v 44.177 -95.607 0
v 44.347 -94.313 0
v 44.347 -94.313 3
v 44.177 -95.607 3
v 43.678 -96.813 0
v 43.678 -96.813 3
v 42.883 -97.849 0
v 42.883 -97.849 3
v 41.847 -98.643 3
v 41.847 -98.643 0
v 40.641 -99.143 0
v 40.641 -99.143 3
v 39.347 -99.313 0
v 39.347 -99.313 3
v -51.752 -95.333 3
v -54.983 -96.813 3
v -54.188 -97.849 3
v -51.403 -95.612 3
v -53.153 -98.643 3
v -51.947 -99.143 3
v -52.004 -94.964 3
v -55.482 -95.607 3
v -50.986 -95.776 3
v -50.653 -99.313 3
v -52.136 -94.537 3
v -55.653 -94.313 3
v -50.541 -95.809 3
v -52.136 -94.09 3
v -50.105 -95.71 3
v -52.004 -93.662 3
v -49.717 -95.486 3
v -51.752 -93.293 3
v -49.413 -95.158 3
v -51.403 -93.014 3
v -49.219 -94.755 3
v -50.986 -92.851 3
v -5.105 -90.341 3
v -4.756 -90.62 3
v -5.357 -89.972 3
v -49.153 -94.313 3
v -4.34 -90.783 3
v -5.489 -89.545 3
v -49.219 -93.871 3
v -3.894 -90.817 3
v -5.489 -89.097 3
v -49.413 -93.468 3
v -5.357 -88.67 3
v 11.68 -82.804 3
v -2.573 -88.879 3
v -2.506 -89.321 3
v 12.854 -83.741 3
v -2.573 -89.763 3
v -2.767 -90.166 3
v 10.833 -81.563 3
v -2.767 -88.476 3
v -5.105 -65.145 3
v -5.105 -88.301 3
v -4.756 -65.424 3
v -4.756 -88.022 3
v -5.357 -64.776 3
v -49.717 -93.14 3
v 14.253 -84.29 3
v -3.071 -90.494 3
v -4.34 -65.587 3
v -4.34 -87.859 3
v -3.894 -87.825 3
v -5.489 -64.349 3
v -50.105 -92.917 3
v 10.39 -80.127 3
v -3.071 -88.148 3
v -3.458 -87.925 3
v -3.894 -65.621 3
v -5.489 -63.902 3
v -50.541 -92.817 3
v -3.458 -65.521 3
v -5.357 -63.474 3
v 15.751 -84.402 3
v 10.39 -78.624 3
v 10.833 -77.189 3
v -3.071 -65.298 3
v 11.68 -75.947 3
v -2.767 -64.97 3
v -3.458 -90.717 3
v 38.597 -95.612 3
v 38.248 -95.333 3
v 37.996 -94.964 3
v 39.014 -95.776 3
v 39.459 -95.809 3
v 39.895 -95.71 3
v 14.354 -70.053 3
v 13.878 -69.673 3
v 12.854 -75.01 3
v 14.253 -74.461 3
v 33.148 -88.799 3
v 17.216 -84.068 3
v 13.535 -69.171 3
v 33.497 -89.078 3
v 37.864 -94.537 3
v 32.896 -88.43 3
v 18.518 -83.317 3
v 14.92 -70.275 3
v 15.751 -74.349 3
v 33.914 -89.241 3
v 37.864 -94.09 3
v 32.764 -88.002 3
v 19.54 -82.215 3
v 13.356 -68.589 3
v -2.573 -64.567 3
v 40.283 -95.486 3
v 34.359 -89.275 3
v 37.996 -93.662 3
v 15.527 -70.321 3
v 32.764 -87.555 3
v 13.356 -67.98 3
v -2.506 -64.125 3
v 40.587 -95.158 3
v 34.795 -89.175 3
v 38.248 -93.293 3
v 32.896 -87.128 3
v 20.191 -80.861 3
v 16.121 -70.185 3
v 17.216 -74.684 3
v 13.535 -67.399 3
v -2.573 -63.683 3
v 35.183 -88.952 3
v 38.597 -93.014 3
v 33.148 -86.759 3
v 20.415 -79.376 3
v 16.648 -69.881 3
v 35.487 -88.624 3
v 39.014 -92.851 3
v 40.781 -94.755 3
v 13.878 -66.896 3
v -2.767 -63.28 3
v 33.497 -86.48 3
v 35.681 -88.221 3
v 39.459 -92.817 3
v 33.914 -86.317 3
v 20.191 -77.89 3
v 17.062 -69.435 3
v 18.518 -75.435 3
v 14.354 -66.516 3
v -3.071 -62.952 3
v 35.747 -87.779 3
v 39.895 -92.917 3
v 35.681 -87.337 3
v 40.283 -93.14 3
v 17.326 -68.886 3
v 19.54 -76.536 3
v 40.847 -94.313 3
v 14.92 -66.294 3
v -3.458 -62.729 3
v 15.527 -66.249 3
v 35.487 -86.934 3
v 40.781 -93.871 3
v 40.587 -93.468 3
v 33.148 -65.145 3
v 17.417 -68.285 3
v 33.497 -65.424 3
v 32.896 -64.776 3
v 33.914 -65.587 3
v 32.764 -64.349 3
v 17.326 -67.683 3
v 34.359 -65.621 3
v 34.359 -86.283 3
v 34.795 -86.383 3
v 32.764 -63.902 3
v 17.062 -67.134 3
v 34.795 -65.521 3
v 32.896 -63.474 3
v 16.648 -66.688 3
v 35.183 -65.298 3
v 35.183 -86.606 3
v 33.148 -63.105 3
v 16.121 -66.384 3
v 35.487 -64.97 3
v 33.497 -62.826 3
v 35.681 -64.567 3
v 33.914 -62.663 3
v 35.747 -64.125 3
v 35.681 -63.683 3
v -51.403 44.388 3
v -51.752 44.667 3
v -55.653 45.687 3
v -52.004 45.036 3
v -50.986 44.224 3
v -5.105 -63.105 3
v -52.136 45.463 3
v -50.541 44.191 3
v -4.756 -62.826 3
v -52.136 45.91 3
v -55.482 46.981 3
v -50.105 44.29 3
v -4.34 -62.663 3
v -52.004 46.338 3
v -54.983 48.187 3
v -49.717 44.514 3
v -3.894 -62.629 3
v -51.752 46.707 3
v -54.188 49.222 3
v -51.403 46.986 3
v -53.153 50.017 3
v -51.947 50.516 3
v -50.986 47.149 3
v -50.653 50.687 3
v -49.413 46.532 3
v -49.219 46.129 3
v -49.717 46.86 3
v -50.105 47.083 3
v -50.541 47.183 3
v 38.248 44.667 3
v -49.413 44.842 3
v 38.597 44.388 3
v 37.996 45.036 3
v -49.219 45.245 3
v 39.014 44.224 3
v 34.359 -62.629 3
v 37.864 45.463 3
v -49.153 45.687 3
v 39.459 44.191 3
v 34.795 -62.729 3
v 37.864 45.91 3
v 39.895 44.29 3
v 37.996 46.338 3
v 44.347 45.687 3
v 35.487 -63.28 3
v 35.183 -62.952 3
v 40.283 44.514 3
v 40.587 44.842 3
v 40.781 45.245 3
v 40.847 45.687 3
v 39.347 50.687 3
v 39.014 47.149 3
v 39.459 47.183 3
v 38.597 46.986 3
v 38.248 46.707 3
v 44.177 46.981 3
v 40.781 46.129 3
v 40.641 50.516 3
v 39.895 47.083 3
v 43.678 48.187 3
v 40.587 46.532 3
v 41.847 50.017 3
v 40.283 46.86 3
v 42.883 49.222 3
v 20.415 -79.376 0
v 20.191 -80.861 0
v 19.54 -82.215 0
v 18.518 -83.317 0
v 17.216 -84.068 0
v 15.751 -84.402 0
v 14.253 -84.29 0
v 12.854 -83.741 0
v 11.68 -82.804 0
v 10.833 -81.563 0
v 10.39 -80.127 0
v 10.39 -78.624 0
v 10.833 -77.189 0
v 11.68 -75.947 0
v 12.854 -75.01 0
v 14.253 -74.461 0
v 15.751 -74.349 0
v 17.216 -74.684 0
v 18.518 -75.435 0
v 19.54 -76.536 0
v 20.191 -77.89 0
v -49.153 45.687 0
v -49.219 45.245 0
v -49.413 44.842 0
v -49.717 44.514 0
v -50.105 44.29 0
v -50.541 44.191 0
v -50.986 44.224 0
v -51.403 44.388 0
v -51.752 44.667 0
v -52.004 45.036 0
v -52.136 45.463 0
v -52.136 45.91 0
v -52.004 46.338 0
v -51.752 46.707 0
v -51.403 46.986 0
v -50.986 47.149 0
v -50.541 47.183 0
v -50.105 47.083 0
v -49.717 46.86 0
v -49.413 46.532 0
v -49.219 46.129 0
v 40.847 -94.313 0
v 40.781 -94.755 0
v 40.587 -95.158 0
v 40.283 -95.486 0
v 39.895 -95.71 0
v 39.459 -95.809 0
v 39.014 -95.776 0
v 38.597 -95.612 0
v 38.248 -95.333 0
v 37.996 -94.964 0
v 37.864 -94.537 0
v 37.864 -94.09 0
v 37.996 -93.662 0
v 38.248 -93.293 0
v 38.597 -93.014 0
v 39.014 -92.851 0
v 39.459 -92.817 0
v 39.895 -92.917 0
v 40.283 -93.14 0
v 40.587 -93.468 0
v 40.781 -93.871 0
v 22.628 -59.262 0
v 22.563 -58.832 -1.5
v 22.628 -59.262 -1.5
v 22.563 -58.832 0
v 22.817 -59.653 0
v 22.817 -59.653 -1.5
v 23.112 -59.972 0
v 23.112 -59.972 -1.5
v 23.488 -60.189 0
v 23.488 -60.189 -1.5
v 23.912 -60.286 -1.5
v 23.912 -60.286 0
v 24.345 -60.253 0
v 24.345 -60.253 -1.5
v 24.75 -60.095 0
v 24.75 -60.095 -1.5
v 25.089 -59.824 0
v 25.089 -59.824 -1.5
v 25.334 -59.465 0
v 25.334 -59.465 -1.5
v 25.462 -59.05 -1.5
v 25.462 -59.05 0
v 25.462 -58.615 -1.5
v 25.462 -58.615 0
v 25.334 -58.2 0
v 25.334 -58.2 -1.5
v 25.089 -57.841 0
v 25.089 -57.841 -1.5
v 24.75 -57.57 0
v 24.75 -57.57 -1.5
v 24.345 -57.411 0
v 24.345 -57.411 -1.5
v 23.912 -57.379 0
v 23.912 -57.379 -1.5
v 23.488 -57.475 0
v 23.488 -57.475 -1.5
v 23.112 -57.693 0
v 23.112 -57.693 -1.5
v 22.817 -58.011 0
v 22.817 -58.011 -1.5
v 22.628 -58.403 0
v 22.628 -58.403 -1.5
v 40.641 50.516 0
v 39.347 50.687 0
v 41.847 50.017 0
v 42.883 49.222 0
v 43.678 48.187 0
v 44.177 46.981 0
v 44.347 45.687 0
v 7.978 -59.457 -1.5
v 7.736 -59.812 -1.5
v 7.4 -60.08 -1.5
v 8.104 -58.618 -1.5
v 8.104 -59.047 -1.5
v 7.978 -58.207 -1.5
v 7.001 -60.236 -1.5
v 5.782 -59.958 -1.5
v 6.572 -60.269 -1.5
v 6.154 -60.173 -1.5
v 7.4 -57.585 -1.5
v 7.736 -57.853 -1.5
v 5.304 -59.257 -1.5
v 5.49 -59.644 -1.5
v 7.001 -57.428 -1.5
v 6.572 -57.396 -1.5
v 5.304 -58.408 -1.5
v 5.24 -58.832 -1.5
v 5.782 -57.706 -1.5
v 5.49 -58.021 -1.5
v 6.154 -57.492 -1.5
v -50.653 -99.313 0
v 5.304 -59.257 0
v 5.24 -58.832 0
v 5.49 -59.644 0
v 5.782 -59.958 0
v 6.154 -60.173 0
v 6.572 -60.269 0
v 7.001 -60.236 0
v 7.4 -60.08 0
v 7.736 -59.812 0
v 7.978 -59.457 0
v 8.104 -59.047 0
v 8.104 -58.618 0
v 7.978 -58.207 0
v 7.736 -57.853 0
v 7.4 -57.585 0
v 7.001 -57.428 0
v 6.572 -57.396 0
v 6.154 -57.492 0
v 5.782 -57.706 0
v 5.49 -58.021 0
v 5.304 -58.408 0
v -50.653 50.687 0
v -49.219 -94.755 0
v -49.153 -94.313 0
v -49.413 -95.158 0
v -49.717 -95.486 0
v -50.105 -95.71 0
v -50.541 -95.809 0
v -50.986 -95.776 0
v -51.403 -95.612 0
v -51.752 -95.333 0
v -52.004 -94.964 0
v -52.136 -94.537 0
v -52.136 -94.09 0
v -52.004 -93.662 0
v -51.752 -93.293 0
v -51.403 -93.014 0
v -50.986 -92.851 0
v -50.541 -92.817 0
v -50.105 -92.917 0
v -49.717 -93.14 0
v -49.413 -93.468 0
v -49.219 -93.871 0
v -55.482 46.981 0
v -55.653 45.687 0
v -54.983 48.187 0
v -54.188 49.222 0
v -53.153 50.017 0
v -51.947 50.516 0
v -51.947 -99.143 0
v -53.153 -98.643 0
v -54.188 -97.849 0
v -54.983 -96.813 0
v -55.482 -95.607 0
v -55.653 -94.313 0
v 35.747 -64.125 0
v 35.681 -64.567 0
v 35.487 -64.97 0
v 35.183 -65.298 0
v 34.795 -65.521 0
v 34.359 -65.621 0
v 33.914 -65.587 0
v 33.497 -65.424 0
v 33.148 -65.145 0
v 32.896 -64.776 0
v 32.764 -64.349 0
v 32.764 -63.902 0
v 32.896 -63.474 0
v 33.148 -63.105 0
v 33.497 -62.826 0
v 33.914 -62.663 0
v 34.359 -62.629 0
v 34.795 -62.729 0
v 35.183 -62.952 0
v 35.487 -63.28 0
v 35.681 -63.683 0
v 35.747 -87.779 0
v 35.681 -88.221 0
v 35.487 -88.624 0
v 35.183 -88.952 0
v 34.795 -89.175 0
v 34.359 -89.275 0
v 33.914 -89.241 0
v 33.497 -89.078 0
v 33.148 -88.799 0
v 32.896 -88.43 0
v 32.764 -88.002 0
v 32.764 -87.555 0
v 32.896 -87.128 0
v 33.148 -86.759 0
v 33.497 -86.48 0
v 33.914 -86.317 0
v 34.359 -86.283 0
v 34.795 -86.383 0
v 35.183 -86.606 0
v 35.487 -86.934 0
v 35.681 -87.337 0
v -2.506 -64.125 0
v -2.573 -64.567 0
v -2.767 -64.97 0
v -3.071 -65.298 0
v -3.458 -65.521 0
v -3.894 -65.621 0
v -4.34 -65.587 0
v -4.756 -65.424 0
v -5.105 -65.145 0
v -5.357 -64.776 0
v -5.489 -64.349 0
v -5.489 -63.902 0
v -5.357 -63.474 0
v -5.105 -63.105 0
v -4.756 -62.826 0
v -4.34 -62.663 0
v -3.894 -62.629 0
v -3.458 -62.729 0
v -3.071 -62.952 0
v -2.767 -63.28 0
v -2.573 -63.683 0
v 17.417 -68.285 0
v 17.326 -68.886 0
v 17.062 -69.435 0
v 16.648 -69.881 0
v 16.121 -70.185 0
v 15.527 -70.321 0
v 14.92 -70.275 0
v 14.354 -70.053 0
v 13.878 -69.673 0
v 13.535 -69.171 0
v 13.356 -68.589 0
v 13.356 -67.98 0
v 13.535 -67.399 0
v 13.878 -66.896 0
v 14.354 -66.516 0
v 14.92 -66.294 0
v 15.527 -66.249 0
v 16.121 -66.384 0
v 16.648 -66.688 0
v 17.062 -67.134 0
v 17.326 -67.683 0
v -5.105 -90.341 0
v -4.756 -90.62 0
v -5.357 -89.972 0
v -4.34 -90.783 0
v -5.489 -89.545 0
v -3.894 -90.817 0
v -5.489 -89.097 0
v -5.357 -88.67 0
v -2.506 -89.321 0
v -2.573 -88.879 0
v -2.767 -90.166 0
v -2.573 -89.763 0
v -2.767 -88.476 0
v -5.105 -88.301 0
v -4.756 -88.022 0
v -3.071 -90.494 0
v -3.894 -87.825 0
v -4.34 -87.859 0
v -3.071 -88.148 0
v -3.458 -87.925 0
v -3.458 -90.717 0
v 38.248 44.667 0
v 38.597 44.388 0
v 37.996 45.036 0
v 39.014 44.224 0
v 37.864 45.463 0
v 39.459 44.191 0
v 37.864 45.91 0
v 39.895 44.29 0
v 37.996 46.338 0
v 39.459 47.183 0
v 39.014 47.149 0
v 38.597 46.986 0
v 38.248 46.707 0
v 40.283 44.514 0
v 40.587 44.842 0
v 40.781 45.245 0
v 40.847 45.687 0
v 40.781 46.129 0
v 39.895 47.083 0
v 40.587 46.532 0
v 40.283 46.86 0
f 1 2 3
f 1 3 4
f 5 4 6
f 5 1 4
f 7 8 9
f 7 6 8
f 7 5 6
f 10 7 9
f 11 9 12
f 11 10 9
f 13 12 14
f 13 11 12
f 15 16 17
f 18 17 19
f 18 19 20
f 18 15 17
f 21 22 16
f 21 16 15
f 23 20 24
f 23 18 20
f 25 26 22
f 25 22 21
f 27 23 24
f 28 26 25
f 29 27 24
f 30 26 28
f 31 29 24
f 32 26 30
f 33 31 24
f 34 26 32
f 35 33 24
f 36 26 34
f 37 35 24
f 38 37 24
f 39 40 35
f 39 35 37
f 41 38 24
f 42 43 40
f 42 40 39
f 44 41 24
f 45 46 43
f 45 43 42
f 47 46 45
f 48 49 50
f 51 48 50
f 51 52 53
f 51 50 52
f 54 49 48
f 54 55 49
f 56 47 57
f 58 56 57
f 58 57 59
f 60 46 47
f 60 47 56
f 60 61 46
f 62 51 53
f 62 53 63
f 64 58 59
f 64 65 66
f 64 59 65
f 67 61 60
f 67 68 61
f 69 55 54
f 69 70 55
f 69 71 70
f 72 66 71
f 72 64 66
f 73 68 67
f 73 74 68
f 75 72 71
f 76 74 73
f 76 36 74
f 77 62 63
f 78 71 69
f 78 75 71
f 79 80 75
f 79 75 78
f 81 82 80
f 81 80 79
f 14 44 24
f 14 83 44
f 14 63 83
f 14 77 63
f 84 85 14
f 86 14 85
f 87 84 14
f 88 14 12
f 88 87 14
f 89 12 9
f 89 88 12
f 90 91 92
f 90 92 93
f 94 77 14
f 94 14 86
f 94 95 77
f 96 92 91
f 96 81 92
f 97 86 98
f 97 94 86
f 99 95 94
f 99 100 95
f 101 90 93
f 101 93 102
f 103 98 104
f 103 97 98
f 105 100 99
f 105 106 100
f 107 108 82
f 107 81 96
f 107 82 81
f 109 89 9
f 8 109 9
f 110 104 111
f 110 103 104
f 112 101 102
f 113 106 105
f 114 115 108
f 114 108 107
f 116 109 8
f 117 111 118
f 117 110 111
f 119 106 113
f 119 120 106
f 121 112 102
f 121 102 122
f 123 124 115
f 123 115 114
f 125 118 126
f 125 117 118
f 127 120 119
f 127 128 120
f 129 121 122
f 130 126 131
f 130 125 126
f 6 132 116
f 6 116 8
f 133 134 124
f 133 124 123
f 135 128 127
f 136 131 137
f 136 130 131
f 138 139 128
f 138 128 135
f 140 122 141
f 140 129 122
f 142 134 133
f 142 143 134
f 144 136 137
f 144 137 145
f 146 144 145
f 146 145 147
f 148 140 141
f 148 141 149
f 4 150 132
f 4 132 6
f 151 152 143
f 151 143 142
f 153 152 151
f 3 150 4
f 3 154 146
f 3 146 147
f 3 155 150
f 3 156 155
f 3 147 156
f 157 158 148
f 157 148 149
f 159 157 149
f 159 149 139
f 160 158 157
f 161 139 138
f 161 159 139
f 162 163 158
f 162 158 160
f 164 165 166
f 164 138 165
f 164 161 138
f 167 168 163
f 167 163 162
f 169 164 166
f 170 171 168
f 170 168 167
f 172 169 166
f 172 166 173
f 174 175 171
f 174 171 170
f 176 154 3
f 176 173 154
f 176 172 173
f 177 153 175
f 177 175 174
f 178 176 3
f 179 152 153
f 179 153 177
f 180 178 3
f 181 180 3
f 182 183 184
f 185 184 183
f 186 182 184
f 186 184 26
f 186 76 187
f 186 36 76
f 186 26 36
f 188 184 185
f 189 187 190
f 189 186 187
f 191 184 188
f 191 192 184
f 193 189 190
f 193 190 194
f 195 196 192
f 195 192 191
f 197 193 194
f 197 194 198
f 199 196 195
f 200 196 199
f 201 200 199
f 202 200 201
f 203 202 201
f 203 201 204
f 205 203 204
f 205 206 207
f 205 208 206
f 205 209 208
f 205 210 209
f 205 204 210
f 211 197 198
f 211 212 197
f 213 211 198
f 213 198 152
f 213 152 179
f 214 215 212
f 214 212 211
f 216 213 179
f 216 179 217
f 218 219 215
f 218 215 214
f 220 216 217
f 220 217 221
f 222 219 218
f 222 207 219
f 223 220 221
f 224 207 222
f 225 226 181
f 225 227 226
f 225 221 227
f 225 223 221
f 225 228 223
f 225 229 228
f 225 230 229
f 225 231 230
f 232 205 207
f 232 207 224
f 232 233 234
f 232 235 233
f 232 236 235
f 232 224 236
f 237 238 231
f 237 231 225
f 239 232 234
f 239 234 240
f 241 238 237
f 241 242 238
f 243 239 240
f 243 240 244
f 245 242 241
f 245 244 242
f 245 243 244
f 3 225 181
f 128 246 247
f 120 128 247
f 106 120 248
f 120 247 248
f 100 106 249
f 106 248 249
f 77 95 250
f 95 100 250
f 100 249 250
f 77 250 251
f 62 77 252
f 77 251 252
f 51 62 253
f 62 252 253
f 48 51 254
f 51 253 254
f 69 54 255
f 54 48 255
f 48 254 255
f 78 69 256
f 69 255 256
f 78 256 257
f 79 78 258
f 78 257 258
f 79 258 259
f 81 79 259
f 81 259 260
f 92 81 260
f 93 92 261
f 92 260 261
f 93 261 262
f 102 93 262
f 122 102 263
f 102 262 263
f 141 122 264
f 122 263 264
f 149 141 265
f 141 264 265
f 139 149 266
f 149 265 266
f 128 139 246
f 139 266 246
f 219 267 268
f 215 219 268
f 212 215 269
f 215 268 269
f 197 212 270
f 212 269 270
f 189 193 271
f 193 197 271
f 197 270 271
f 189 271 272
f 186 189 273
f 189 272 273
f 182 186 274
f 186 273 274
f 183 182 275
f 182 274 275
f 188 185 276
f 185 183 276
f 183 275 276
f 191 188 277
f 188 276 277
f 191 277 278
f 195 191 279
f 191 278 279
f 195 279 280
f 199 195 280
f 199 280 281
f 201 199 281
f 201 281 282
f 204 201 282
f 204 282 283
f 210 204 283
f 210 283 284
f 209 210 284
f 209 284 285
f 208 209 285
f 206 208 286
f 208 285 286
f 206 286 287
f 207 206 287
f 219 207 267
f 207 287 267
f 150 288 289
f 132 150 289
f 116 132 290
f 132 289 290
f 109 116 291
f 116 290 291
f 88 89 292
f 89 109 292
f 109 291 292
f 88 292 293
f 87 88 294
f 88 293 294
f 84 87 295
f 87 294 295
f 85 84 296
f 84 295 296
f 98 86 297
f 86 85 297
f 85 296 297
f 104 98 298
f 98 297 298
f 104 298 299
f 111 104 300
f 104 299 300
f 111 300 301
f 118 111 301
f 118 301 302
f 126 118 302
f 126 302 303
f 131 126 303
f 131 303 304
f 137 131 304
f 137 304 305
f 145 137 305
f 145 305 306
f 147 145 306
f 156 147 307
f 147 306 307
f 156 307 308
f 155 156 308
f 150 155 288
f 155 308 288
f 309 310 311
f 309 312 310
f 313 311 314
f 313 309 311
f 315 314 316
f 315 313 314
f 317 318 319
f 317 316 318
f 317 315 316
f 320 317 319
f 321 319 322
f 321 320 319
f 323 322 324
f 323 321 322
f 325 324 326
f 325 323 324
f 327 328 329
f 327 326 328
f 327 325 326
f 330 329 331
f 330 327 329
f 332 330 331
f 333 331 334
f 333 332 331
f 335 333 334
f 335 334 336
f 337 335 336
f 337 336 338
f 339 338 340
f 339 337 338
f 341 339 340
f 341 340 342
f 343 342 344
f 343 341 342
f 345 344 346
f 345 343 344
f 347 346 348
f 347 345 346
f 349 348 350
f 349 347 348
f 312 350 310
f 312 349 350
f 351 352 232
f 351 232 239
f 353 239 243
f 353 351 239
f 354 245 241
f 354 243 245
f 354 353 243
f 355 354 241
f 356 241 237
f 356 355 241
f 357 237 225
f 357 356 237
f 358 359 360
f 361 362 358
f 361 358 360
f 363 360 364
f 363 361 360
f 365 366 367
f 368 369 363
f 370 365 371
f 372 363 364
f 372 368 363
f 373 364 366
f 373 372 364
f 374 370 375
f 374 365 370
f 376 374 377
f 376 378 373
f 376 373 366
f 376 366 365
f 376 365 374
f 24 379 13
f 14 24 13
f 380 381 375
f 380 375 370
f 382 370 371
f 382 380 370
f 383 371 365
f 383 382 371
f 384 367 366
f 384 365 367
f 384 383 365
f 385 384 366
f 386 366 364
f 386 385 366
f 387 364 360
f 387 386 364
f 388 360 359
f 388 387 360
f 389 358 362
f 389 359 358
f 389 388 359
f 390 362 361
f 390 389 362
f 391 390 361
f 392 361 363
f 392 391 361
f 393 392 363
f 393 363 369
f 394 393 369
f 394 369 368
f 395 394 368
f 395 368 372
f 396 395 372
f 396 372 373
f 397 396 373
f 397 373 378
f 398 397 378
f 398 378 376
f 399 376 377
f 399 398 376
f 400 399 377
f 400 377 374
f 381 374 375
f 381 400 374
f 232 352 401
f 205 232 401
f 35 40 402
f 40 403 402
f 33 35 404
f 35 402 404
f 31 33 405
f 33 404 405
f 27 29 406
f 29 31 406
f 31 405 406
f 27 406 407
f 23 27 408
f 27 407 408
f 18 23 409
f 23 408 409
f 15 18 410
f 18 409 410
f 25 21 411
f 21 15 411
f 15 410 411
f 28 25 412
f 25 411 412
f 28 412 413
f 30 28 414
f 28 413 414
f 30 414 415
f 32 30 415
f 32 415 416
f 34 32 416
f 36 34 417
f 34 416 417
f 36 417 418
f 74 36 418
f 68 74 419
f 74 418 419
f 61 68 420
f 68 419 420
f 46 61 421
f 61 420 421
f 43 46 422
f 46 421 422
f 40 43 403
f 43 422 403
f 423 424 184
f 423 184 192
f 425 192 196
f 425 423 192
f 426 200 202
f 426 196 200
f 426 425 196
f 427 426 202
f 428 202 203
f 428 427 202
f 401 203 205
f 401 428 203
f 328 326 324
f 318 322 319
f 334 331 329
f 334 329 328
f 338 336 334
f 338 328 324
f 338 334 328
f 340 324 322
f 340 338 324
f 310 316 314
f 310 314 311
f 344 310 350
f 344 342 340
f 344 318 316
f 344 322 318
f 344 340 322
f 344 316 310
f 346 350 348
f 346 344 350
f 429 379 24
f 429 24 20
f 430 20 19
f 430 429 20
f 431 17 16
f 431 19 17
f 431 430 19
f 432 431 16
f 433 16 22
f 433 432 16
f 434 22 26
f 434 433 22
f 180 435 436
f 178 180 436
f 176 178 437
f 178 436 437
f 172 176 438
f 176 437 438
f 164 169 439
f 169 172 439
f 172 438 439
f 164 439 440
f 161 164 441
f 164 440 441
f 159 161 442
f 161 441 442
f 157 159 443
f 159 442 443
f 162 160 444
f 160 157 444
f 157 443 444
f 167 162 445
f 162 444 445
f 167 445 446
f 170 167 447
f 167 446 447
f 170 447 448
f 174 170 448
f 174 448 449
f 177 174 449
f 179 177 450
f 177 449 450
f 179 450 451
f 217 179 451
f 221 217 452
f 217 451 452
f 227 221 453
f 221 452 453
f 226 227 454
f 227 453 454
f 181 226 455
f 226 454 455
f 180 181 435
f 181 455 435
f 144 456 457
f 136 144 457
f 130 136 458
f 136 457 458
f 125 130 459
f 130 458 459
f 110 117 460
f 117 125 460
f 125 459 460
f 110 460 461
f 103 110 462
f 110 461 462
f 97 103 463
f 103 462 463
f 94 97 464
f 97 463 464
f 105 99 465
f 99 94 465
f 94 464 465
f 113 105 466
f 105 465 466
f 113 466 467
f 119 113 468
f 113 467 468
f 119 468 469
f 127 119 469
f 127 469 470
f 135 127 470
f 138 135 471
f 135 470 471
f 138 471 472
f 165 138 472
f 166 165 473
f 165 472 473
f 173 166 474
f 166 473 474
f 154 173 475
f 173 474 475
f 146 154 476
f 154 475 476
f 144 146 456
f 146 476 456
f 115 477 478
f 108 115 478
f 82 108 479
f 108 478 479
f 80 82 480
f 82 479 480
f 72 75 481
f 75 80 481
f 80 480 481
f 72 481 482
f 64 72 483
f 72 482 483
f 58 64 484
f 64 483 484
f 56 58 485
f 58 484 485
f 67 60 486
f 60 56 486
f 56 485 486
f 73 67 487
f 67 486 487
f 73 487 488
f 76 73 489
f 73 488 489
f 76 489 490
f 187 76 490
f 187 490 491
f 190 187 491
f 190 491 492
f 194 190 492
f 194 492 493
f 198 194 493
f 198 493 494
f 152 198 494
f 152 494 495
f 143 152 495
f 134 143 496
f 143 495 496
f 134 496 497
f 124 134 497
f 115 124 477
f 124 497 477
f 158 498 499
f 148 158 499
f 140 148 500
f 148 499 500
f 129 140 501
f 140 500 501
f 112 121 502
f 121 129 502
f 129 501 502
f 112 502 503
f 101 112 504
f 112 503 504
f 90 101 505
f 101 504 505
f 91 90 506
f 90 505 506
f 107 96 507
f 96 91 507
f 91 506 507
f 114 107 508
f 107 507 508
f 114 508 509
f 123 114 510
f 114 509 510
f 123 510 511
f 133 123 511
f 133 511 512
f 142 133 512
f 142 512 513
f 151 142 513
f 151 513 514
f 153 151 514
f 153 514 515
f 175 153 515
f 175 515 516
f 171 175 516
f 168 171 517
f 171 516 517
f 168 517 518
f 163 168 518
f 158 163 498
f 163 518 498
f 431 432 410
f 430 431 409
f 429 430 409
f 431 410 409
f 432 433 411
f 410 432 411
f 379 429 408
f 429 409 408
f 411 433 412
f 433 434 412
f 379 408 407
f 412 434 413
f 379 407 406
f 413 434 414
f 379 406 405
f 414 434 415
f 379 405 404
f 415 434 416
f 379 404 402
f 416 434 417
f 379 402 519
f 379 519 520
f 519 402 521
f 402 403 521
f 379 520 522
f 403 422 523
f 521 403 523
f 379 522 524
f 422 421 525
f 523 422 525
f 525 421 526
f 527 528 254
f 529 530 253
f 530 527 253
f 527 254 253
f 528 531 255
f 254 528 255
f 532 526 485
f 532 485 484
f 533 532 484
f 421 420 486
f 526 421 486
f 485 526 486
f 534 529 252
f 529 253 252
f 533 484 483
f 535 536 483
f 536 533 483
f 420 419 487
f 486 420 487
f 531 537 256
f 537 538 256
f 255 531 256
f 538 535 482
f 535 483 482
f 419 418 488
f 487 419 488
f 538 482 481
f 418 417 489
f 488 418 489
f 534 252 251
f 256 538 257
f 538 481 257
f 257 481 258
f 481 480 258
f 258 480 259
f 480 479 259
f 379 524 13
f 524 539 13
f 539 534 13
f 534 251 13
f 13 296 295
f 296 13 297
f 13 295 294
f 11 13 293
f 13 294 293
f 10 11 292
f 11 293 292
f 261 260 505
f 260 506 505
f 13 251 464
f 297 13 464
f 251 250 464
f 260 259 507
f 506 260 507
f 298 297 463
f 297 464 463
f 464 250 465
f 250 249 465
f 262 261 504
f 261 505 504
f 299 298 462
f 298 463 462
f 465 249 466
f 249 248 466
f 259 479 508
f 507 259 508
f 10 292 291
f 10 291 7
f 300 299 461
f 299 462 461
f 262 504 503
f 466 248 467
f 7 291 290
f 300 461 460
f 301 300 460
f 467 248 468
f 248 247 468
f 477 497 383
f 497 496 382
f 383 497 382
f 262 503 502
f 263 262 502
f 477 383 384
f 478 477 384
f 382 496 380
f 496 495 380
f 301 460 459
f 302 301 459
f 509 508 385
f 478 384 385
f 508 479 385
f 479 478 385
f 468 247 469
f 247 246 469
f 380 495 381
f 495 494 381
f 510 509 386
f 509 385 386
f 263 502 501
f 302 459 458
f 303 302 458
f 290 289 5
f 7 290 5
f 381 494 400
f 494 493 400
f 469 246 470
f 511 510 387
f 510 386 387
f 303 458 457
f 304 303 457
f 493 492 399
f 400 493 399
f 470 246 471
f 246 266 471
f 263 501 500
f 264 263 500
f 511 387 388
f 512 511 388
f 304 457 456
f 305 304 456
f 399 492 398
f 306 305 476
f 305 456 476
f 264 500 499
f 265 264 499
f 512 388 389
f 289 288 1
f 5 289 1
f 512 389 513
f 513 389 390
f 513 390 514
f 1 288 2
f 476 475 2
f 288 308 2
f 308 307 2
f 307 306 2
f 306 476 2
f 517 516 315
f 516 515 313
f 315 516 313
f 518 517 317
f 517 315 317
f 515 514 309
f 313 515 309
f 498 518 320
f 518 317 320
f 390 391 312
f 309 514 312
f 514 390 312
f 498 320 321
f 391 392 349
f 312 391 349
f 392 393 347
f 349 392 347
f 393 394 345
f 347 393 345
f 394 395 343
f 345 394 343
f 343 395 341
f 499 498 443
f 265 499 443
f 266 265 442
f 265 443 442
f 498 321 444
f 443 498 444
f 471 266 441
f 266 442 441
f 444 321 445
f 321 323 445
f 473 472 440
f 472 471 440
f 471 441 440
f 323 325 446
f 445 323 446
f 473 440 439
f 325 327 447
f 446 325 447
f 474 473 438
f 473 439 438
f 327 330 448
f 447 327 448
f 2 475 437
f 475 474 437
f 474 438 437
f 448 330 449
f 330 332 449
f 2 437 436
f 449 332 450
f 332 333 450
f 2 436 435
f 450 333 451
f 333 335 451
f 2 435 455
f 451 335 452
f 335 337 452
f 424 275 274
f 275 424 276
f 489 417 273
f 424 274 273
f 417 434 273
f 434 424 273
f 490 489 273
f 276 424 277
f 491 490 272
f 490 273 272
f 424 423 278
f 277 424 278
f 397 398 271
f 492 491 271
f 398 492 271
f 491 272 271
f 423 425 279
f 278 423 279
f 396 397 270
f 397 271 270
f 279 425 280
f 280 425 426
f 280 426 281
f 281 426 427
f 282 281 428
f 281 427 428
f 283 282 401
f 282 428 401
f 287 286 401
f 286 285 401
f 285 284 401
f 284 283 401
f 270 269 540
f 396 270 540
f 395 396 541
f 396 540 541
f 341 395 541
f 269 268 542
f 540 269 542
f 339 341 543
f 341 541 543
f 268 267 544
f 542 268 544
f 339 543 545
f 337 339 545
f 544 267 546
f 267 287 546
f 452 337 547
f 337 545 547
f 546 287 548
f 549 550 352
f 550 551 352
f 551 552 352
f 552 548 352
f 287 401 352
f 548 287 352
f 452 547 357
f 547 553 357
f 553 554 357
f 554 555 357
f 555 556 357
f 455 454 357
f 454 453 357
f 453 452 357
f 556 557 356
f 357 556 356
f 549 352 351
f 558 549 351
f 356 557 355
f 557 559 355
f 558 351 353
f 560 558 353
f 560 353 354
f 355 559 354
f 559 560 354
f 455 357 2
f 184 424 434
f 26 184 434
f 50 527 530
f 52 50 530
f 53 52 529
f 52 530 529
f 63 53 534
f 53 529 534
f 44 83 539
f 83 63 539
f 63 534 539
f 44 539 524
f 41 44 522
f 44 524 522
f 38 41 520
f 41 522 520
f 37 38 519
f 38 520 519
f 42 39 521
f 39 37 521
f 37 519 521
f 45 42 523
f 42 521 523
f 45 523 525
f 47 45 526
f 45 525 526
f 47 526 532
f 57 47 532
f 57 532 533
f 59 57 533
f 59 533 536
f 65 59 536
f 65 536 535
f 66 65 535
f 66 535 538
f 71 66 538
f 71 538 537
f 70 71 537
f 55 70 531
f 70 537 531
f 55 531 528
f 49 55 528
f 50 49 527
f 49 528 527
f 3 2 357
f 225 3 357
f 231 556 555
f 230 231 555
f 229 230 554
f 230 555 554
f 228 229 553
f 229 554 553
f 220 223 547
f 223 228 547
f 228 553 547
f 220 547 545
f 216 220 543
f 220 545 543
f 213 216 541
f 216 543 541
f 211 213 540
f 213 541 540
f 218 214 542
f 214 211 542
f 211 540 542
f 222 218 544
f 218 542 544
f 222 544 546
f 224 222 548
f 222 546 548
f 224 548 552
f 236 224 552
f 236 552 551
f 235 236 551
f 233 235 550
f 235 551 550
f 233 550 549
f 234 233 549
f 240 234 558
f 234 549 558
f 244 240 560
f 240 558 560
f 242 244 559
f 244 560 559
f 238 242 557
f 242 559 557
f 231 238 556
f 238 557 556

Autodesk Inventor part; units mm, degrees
ref_plane "YZ Plane" through (0, 0, 0) normal (1, 0, 0) x (0, 1, 0)
ref_plane "XZ Plane" through (0, 0, 0) normal (0, 1, 0) x (-1, 0, 0)
ref_plane "XY Plane" through (0, 0, 0) normal (0, 0, 1) x (1, 0, 0)
ref_plane "Work Plane1" through (0, 0, 0) normal (0, 0, 1) x (1, 0, 0)
sketch "Sketch1" plane through (0, 0, 0) normal (0, 0, 1) x (1, 0, 0)
  line L0 (39.3474, 50.6868) -> (-50.6526, 50.6868)
  line L1 (-55.6526, 45.6868) -> (-55.6526, -94.3132)
  line L2 (-50.6526, -99.3132) -> (39.3474, -99.3132)
  line L3 (44.3474, -94.3132) -> (44.3474, 45.6868)
  circle A0 centre (15.3748, -79.3757) radius 5.0406
  circle A1 centre (15.3748, -68.2846) radius 2.0418
  arc A2 (44.3474, 45.6868) -> (39.3474, 50.6868) centre (39.3474, 45.6868) ccw
  arc A3 (39.3474, -99.3132) -> (44.3474, -94.3132) centre (39.3474, -94.3132) ccw
  arc A4 (-55.6526, -94.3132) -> (-50.6526, -99.3132) centre (-50.6526, -94.3132) ccw
  arc A5 (-50.6526, 50.6868) -> (-55.6526, 45.6868) centre (-50.6526, 45.6868) ccw
  circle A6 centre (39.3474, 45.6868) radius 1.5
  circle A7 centre (39.3474, -94.3132) radius 1.5
  circle A8 centre (-50.6526, -94.3132) radius 1.5
  circle A9 centre (-50.6526, 45.6868) radius 1.5
  circle A10 centre (-4.0059, -64.1251) radius 1.5
  circle A11 centre (-4.0059, -89.321) radius 1.5
  circle A12 centre (34.2474, -64.1251) radius 1.5
  circle A13 centre (34.2474, -87.7789) radius 1.5
  point P0 (0, 0)
  point P1 (15.2639, -84.621)
  point P2 (44.3474, 50.6868)
  point P3 (-55.6526, -99.3132)
  point P4 (44.3474, -99.3132)
  dimension "d0" = 100
  dimension "d1" = 150
  dimension "d2" = 5
  dimension "d3" = 3
  dimension "d4" = 3
  dimension "d5" = 3
  dimension "d6" = 3
  dimension "d7" = 3
  dimension "d8" = 3
  dimension "d9" = 3
  dimension "d10" = 3
extrude "Extrusion1" add sketch "Sketch1" along normal blind 3
sketch "Sketch2" plane through (0, 0, 0) normal (0, 0, -1) x (-1, 0, 0)
  circle A0 centre (-6.6801, -58.8323) radius 1.4403
  circle A1 centre (-24.0209, -58.8323) radius 1.4576
  point P0 (0, 0)
extrude "Extrusion2" add sketch "Sketch2" along normal blind 1.5
properties part number "TopPlate" material "Glass"
